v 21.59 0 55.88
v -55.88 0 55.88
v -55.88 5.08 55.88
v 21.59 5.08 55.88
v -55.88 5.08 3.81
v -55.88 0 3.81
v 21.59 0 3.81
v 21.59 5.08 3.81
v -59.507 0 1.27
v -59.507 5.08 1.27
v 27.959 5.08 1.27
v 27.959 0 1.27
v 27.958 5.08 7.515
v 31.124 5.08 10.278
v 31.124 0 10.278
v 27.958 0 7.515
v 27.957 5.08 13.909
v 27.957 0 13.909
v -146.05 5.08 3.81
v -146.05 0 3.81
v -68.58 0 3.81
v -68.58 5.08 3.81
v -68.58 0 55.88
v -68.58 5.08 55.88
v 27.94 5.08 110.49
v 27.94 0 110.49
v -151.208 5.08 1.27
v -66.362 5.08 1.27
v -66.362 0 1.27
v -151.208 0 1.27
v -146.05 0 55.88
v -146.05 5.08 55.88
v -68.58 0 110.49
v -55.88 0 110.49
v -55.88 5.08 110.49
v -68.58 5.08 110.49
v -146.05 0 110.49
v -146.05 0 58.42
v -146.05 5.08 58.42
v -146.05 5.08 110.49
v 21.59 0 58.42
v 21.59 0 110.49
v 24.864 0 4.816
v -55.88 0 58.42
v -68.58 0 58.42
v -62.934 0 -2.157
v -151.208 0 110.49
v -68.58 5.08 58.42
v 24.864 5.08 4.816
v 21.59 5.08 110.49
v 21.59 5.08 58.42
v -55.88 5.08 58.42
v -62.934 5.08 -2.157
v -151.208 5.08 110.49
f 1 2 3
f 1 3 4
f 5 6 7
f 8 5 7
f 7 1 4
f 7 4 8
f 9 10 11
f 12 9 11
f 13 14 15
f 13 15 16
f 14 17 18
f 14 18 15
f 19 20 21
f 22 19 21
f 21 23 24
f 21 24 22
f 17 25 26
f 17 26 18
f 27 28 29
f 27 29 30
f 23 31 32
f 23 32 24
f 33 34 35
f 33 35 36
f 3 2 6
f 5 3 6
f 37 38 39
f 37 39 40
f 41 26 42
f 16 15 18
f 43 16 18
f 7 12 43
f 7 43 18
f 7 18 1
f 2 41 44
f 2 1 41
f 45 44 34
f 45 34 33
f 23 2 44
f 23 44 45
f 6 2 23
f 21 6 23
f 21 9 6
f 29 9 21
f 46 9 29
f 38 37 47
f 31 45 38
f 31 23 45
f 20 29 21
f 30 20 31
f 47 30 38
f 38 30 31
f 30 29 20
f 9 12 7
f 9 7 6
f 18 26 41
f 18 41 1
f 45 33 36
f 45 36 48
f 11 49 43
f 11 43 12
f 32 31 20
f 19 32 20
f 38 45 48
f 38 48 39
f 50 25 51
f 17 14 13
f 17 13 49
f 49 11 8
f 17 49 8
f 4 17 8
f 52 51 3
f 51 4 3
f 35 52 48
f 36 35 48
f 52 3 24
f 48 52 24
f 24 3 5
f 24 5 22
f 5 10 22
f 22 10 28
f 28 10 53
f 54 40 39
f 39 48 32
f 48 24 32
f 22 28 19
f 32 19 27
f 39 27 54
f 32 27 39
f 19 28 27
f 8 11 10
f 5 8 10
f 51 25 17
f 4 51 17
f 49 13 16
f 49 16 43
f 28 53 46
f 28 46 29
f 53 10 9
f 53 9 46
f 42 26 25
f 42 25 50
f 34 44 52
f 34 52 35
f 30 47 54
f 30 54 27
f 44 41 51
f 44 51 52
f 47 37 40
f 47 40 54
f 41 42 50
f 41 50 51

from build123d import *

# Parameters (mm, degrees)
SKETCH1_W           = 77.47
SKETCH1_H           = 52.07
BOSS_EXTRUDE4_DEPTH = 5.08
CUT_EXTRUDE9_DEPTH  = 5.08
CUT_EXTRUDE10_DEPTH = 5.08


with BuildPart() as part:
    # Sketch1 → Boss-Extrude4 (new body)
    with BuildSketch(Plane(origin=(0, 0, 0), x_dir=(1, 0, 0), z_dir=(0, 1, 0))):
        Polygon((-151.207591036, -110.49), (-146.05, -110.49), (-146.05, -58.42), (-68.58, -58.42), (-68.58, -110.49), (-55.88, -110.49), (-55.88, -58.42), (21.59, -58.42), (21.59, -110.49), (34.29, -110.49), (34.29, -58.42), (111.76, -58.42), (111.76, -110.49), (151.052408964, -110.49), (151.052408964, 110.49), (-151.207591036, 110.49), align=None)
        with Locations((-107.315, -29.845)):
            Rectangle(SKETCH1_W, SKETCH1_H, mode=Mode.SUBTRACT)
        with Locations((-17.145, -29.845)):
            Rectangle(SKETCH1_W, SKETCH1_H, mode=Mode.SUBTRACT)
        with Locations((73.025, -29.845)):
            Rectangle(SKETCH1_W, SKETCH1_H, mode=Mode.SUBTRACT)
        with Locations((-107.315, 24.765)):
            Rectangle(SKETCH1_W, SKETCH1_H, mode=Mode.SUBTRACT)
        with Locations((-17.145, 24.765)):
            Rectangle(SKETCH1_W, SKETCH1_H, mode=Mode.SUBTRACT)
        with Locations((-107.315, 79.375)):
            Rectangle(SKETCH1_W, SKETCH1_H, mode=Mode.SUBTRACT)
        with Locations((-17.145, 79.375)):
            Rectangle(SKETCH1_W, SKETCH1_H, mode=Mode.SUBTRACT)
        with Locations((73.025, 24.765)):
            Rectangle(SKETCH1_W, SKETCH1_H, mode=Mode.SUBTRACT)
        with Locations((73.025, 79.375)):
            Rectangle(SKETCH1_W, SKETCH1_H, mode=Mode.SUBTRACT)
    extrude(amount=BOSS_EXTRUDE4_DEPTH)

    # Sketch8 → Cut-Extrude9 (cut)
    # profile 1 of 7: a face of its own
    with BuildSketch(Plane(origin=(0, 5.08, 0), x_dir=(1, 0, 0), z_dir=(0, 1, 0))):
        Polygon((118.11, 79.293589744), (111.76, 76.362820513), (111.76, 76.982301683), (113.79525641, 77.921063702), (113.79525641, 80.799679487), (111.76, 81.765154247), (111.76, 82.387179487), (118.11, 79.375), align=None)
        Polygon((116.872309696, 79.340655048), (114.446538462, 80.49057492), (114.446538462, 78.221264022), align=None, mode=Mode.SUBTRACT)
    # profile 2 of 7: a face of its own
    with BuildSketch(Plane(origin=(0, 5.08, 0), x_dir=(1, 0, 0), z_dir=(0, 1, 0))):
        with BuildLine():
            Line((118.11, 26.474615385), (118.11, 25.235653045))
            add(Edge.make_bspline(
                [(118.11, 25.235653045), (118.109681139, 25.175004234), (118.109063106, 25.057451746), (118.099477996, 24.886510758), (118.086408481, 24.726402202), (118.065671027, 24.577079644), (118.040648803, 24.438612083), (118.010346937, 24.310582227), (117.974012938, 24.193397201), (117.916234684, 24.053492664), (117.830376936, 23.893979465), (117.703506539, 23.721262382), (117.548326213, 23.573571833), (117.37327911, 23.4462338), (117.180718496, 23.344994626), (116.975233967, 23.271753187), (116.75947595, 23.225383899), (116.611351899, 23.220615168), (116.536492388, 23.218205128)],
                knots=[0, 0, 0, 0, 1.001505555, 1.941167018, 2.826882275, 3.653841531, 4.429895133, 5.150066043, 5.825578002, 6.45369114, 7.647487171, 8.808567382, 9.977351308, 11.170798116, 12.373658725, 13.556498008, 14.765093433, 16, 16, 16, 16], degree=3))
            add(Edge.make_bspline(
                [(116.536492388, 23.218205128), (116.466353726, 23.220150205), (116.328524642, 23.223972465), (116.12725909, 23.261767034), (115.934882118, 23.318037757), (115.753765338, 23.399726219), (115.586236491, 23.504802861), (115.433291194, 23.631250472), (115.29863595, 23.781802882), (115.223670167, 23.894781468), (115.185590946, 23.952169471)],
                knots=[0, 0, 0, 0, 1.044266239, 2.052081639, 3.041743201, 4.026043445, 5.00270663, 5.980942822, 6.97441044, 8, 8, 8, 8], degree=3))
            add(Edge.make_bspline(
                [(115.185590946, 23.952169471), (115.157917248, 23.880020614), (115.10497061, 23.741981978), (115.010852235, 23.551885993), (114.90963819, 23.387448746), (114.798522364, 23.248489243), (114.677253559, 23.131437365), (114.548260115, 23.026322349), (114.405191505, 22.938259533), (114.252121508, 22.862606152), (114.090124446, 22.803067733), (113.919941192, 22.760940396), (113.743474705, 22.735055197), (113.623194862, 22.731525492), (113.562473958, 22.72974359)],
                knots=[0, 0, 0, 0, 1.272302504, 2.434229863, 3.488457646, 4.447234501, 5.35599188, 6.26022912, 7.18267843, 8.11661068, 9.06895546, 10.019249207, 11.000057067, 12, 12, 12, 12], degree=3))
            add(Edge.make_bspline(
                [(113.562473958, 22.72974359), (113.500485842, 22.731516424), (113.378522486, 22.735004524), (113.199347436, 22.7607231), (113.028142769, 22.804311677), (112.863691196, 22.864204763), (112.70692357, 22.942816916), (112.555876508, 23.036423505), (112.414573802, 23.150354586), (112.279655118, 23.277346904), (112.158418428, 23.421179366), (112.05048411, 23.576340817), (111.961311987, 23.745062992), (111.887341532, 23.924729456), (111.830014808, 24.116534097), (111.790215937, 24.31976575), (111.763336967, 24.53446858), (111.761131196, 24.681807332), (111.76, 24.757367788)],
                knots=[0, 0, 0, 0, 0.978404568, 1.925038397, 2.85041836, 3.763147166, 4.682162379, 5.614488577, 6.562659439, 7.54271123, 8.535210642, 9.526693784, 10.520907202, 11.541451354, 12.589717429, 13.675358278, 14.807842563, 16, 16, 16, 16], degree=3))
            Line((111.76, 24.757367788), (111.76, 26.474615385))
            Line((111.76, 26.474615385), (118.11, 26.474615385))
        make_face()
        with BuildLine():
            Line((117.458717949, 25.90474359), (115.423461538, 25.90474359))
            Line((115.423461538, 25.90474359), (115.423461538, 25.521860978))
            add(Edge.make_bspline(
                [(115.423461538, 25.521860978), (115.424181075, 25.465891945), (115.425571367, 25.357748368), (115.429679415, 25.200723225), (115.440678409, 25.055331233), (115.452311659, 24.921071395), (115.470224485, 24.798843581), (115.49214475, 24.688238604), (115.515124768, 24.588262886), (115.554315522, 24.473021329), (115.611648095, 24.342338932), (115.702715767, 24.203911992), (115.808237502, 24.079896012), (115.932241327, 23.976344233), (116.067626032, 23.890895914), (116.214403686, 23.833871415), (116.366844139, 23.793424687), (116.471770578, 23.789877771), (116.525044071, 23.788076923)],
                knots=[0, 0, 0, 0, 1.156481963, 2.23455883, 3.244418989, 4.168404366, 5.01828131, 5.794834307, 6.498111525, 7.13526334, 8.307595709, 9.435046769, 10.546766856, 11.659452936, 12.760769924, 13.837671619, 14.902137667, 16, 16, 16, 16], degree=3))
            add(Edge.make_bspline(
                [(116.525044071, 23.788076923), (116.56030457, 23.788977603), (116.629471889, 23.790744385), (116.729913527, 23.8068242), (116.82558773, 23.830156168), (116.914294057, 23.866607821), (116.998553798, 23.910685404), (117.074624411, 23.96802234), (117.1466735, 24.032775181), (117.212055599, 24.108821091), (117.270638216, 24.195791849), (117.322185781, 24.294516129), (117.362847974, 24.406172748), (117.399324126, 24.528230019), (117.4246346, 24.66264136), (117.445797527, 24.808093389), (117.456555228, 24.965820019), (117.457980962, 25.074940101), (117.458717949, 25.131346154)],
                knots=[0, 0, 0, 0, 0.911752476, 1.788502045, 2.626783689, 3.45400582, 4.26402138, 5.080402872, 5.911472738, 6.767166405, 7.66795952, 8.620018292, 9.640966946, 10.73819047, 11.913090943, 13.176185384, 14.540321519, 16, 16, 16, 16], degree=3))
            Line((117.458717949, 25.131346154), (117.458717949, 25.90474359))
        make_face(mode=Mode.SUBTRACT)
        with BuildLine():
            Line((114.772179487, 25.90474359), (112.411282051, 25.90474359))
            Line((112.411282051, 25.90474359), (112.411282051, 25.093185096))
            add(Edge.make_bspline(
                [(112.411282051, 25.093185096), (112.411975847, 25.035093328), (112.413313047, 24.923129104), (112.417726104, 24.761477849), (112.427553327, 24.612056238), (112.443574322, 24.47477829), (112.460221531, 24.348435585), (112.483262073, 24.23428334), (112.509456384, 24.132146551), (112.549993321, 24.013731405), (112.612860676, 23.880302727), (112.708268617, 23.736613475), (112.820435778, 23.607586425), (112.95189156, 23.499274679), (113.093745082, 23.409835086), (113.245254404, 23.347105881), (113.401797428, 23.306771901), (113.508807295, 23.302005692), (113.562473958, 23.299615385)],
                knots=[0, 0, 0, 0, 1.159821618, 2.235403267, 3.228114831, 4.14795534, 4.994323282, 5.771256229, 6.471395042, 7.097801288, 8.267864287, 9.404187171, 10.531774336, 11.667624178, 12.792825787, 13.866573821, 14.930062559, 16, 16, 16, 16], degree=3))
            add(Edge.make_bspline(
                [(113.562473958, 23.299615385), (113.596030503, 23.300103956), (113.662602321, 23.301073218), (113.760357737, 23.31624054), (113.855472736, 23.337399943), (113.946509043, 23.368040578), (114.034948011, 23.406675936), (114.119249173, 23.455161844), (114.2014282, 23.511153881), (114.305201688, 23.598743929), (114.42480707, 23.726024945), (114.541892162, 23.906931894), (114.636322991, 24.112618706), (114.676417579, 24.261803289), (114.697129407, 24.338868189)],
                knots=[0, 0, 0, 0, 0.723503378, 1.435336582, 2.130201219, 2.824764462, 3.504949994, 4.209866579, 4.920640069, 5.648298893, 7.13757748, 8.670694625, 10.280166878, 12, 12, 12, 12], degree=3))
            add(Edge.make_bspline(
                [(114.697129407, 24.338868189), (114.703398338, 24.369763806), (114.716990673, 24.436751875), (114.731329404, 24.545986183), (114.744191712, 24.671110852), (114.753456167, 24.811591078), (114.763401398, 24.967985569), (114.767131466, 25.140244081), (114.771684212, 25.328488394), (114.772010172, 25.459103286), (114.772179487, 25.526949119)],
                knots=[0, 0, 0, 0, 0.634452549, 1.375623993, 2.216454381, 3.166361212, 4.209414599, 5.370755378, 6.634280627, 8, 8, 8, 8], degree=3))
            Line((114.772179487, 25.526949119), (114.772179487, 25.90474359))
        make_face(mode=Mode.SUBTRACT)
    # profile 3 of 7: a face of its own
    with BuildSketch(Plane(origin=(0, 5.08, 0), x_dir=(1, 0, 0), z_dir=(0, 1, 0))):
        with BuildLine():
            Line((116.944815705, -32.938589744), (116.563205128, -32.439951923))
            add(Edge.make_bspline(
                [(116.563205128, -32.439951923), (116.605597673, -32.40438124), (116.689811221, -32.333719444), (116.808065537, -32.220037748), (116.918855368, -32.10156191), (117.022708493, -31.978337218), (117.115993196, -31.848145673), (117.203570769, -31.714141081), (117.282070808, -31.574081771), (117.377253654, -31.380403623), (117.476578821, -31.127042527), (117.559860398, -30.808100462), (117.612875959, -30.475158898), (117.618617886, -30.248014681), (117.621538462, -30.132479968)],
                knots=[0, 0, 0, 0, 0.757959112, 1.505699292, 2.245454638, 2.979532153, 3.711538275, 4.438200793, 5.171680507, 5.909471876, 7.393775596, 8.890124382, 10.418191784, 12, 12, 12, 12], degree=3))
            add(Edge.make_bspline(
                [(117.621538462, -30.132479968), (117.620802251, -30.068829613), (117.619336663, -29.942119638), (117.600137483, -29.754060275), (117.572842033, -29.56915638), (117.533326202, -29.388095544), (117.481880175, -29.211237272), (117.421547717, -29.037234935), (117.346470096, -28.868137816), (117.263556886, -28.701910874), (117.169880198, -28.542661658), (117.067735433, -28.391952614), (116.958125128, -28.250472259), (116.84133222, -28.117828549), (116.715905207, -27.995476207), (116.58331959, -27.881454356), (116.441979536, -27.777817938), (116.294535759, -27.682020268), (116.140771545, -27.596777475), (115.9816542, -27.523166197), (115.817792087, -27.46007521), (115.648849522, -27.409690045), (115.475491338, -27.369948117), (115.297349628, -27.342492588), (115.114770175, -27.323466123), (114.991019157, -27.322014016), (114.928639824, -27.321282051)],
                knots=[0, 0, 0, 0, 1.055000685, 2.100209969, 3.131349012, 4.153242145, 5.170189196, 6.184191144, 7.204341339, 8.235672124, 9.263040994, 10.265373269, 11.252624173, 12.22887325, 13.193405896, 14.155809299, 15.126090485, 16.097288279, 17.069732292, 18.038585918, 19.002221264, 19.978698174, 20.959418239, 21.948869816, 22.966084182, 24, 24, 24, 24], degree=3))
            add(Edge.make_bspline(
                [(114.928639824, -27.321282051), (114.834784429, -27.323571352), (114.650511811, -27.328066089), (114.380599417, -27.368068066), (114.122026195, -27.428855875), (113.876408481, -27.519961279), (113.640717603, -27.632300128), (113.418941397, -27.774250951), (113.207728487, -27.938655241), (113.012070568, -28.12783883), (112.833338524, -28.335403668), (112.675948183, -28.55810345), (112.544748325, -28.795383515), (112.435571964, -29.044623973), (112.351649044, -29.307742779), (112.29256842, -29.584266778), (112.254029036, -29.873594541), (112.250339344, -30.071296166), (112.248461538, -30.171913061)],
                knots=[0, 0, 0, 0, 1.029171465, 2.020641659, 2.987623507, 3.938342917, 4.889210282, 5.84687017, 6.821220943, 7.821438502, 8.827599549, 9.822697543, 10.807740252, 11.797342354, 12.80366471, 13.83203677, 14.896651826, 16, 16, 16, 16], degree=3))
            add(Edge.make_bspline(
                [(112.248461538, -30.171913061), (112.251525467, -30.282770797), (112.257556013, -30.50096534), (112.308644936, -30.820947331), (112.391481444, -31.127263648), (112.507410532, -31.41993077), (112.658114697, -31.698123628), (112.840809417, -31.962277569), (113.057232535, -32.212615561), (113.222483354, -32.363149173), (113.306794872, -32.439951923)],
                knots=[0, 0, 0, 0, 1.028121516, 2.023589091, 2.998037872, 3.967518031, 4.937445131, 5.927275754, 6.942489185, 8, 8, 8, 8], degree=3))
            Line((113.306794872, -32.439951923), (112.929000401, -32.938589744))
            add(Edge.make_bspline(
                [(112.929000401, -32.938589744), (112.877223407, -32.898461226), (112.773917427, -32.818396404), (112.628282924, -32.688750355), (112.491292127, -32.552178781), (112.36407883, -32.407649584), (112.243987323, -32.256891333), (112.135043577, -32.097248498), (112.033928993, -31.93147842), (111.942568033, -31.758615962), (111.860652906, -31.579228654), (111.791497891, -31.393503181), (111.731069307, -31.20301302), (111.681684053, -31.007662239), (111.643076564, -30.806798224), (111.617282312, -30.601110145), (111.599606535, -30.390163816), (111.597995761, -30.247848605), (111.597179487, -30.175729167)],
                knots=[0, 0, 0, 0, 0.986756325, 1.968786143, 2.935506311, 3.899499537, 4.868307269, 5.8376204, 6.809456583, 7.792545619, 8.781780509, 9.778496008, 10.776623214, 11.79151764, 12.812666265, 13.856269958, 14.913646641, 16, 16, 16, 16], degree=3))
            add(Edge.make_bspline(
                [(111.597179487, -30.175729167), (111.597654817, -30.107432799), (111.598594721, -29.97238519), (111.613820511, -29.772997455), (111.634593605, -29.578887787), (111.665872129, -29.390610966), (111.702782574, -29.207139554), (111.752260425, -29.030136779), (111.807685342, -28.857860898), (111.872827246, -28.691004051), (111.946335178, -28.52942431), (112.029414149, -28.373642823), (112.121365532, -28.223731239), (112.220162479, -28.07821569), (112.328978441, -27.939245788), (112.446302192, -27.805617249), (112.571738298, -27.676580756), (112.662189246, -27.596747314), (112.707666266, -27.556608574)],
                knots=[0, 0, 0, 0, 1.114604814, 2.203992996, 3.262667896, 4.300477797, 5.318619304, 6.316056647, 7.298880507, 8.271930387, 9.238335007, 10.195173496, 11.151986948, 12.108099108, 13.064862484, 14.031167946, 15.010108607, 16, 16, 16, 16], degree=3))
            add(Edge.make_bspline(
                [(112.707666266, -27.556608574), (112.786662423, -27.492318192), (112.943701026, -27.364513598), (113.198219878, -27.200999858), (113.463955057, -27.061032151), (113.742302642, -26.947864409), (114.032638045, -26.859394879), (114.335107621, -26.798106139), (114.649428887, -26.758279657), (114.86321849, -26.753725276), (114.971889022, -26.751410256)],
                knots=[0, 0, 0, 0, 0.994628077, 1.977248131, 2.950237994, 3.925870899, 4.908910175, 5.911660606, 6.938484602, 8, 8, 8, 8], degree=3))
            add(Edge.make_bspline(
                [(114.971889022, -26.751410256), (115.086103424, -26.754244442), (115.310813128, -26.759820525), (115.640671219, -26.806804203), (115.956243845, -26.883302707), (116.258745252, -26.988641657), (116.546444643, -27.127611896), (116.820557094, -27.295846609), (117.080858784, -27.494989044), (117.324021732, -27.72253816), (117.546337205, -27.97213776), (117.741930009, -28.239412742), (117.904702809, -28.523860895), (118.040767384, -28.82234304), (118.145350881, -29.137095699), (118.218563099, -29.467446937), (118.264132722, -29.812776116), (118.269893457, -30.048383659), (118.272820513, -30.168096955)],
                knots=[0, 0, 0, 0, 1.032901378, 2.032168977, 3.007206631, 3.966850309, 4.924221947, 5.891988639, 6.871730993, 7.884084801, 8.900290346, 9.89161143, 10.874607481, 11.860025555, 12.854717796, 13.869097222, 14.917278314, 16, 16, 16, 16], degree=3))
            add(Edge.make_bspline(
                [(118.272820513, -30.168096955), (118.27194643, -30.24105764), (118.270216271, -30.385475968), (118.253322795, -30.599110851), (118.225211517, -30.807112405), (118.186697164, -31.009983654), (118.139491479, -31.208460249), (118.077695589, -31.40050597), (118.005935411, -31.587166578), (117.925394904, -31.768581871), (117.833318651, -31.942778105), (117.733314188, -32.109723579), (117.623073079, -32.267404402), (117.506239897, -32.418786561), (117.378444314, -32.560461963), (117.243848093, -32.696476823), (117.098457292, -32.822132675), (116.996123317, -32.89969966), (116.944815705, -32.938589744)],
                knots=[0, 0, 0, 0, 1.096705196, 2.170817488, 3.219277236, 4.250701065, 5.274195539, 6.284202015, 7.28098643, 8.279664616, 9.266225751, 10.241373748, 11.203306326, 12.157093976, 13.114198862, 14.069774147, 15.032234603, 16, 16, 16, 16], degree=3))
        make_face()
    # profile 4 of 7: a face of its own
    with BuildSketch(Plane(origin=(0, 5.08, 0), x_dir=(1, 0, 0), z_dir=(0, 1, 0))):
        with BuildLine():
            Line((111.76, -82.012692308), (118.11, -82.012692308))
            Line((118.11, -82.012692308), (118.11, -83.294903846))
            add(Edge.make_bspline(
                [(118.11, -83.294903846), (118.10919924, -83.406426385), (118.107652175, -83.62188735), (118.097786915, -83.933238257), (118.080511466, -84.220906485), (118.054862343, -84.484728674), (118.024076207, -84.725128674), (117.984923928, -84.941721457), (117.938878197, -85.134858028), (117.899605318, -85.253638066), (117.881033654, -85.309807692)],
                knots=[0, 0, 0, 0, 1.314317071, 2.539253741, 3.67075822, 4.709970291, 5.662644612, 6.526156501, 7.303037452, 8, 8, 8, 8], degree=3))
            add(Edge.make_bspline(
                [(117.881033654, -85.309807692), (117.853037914, -85.383276673), (117.797681284, -85.528548601), (117.693258165, -85.735390771), (117.574941266, -85.930107124), (117.44258475, -86.11375686), (117.2924032, -86.282089414), (117.130916153, -86.441891296), (116.951524797, -86.585988874), (116.760320009, -86.720164865), (116.555362101, -86.837571052), (116.340810785, -86.941109671), (116.117067511, -87.029513574), (115.882503759, -87.098492965), (115.639371325, -87.15548169), (115.385829701, -87.193719768), (115.123356971, -87.219119775), (114.945238152, -87.221659883), (114.854861779, -87.222948718)],
                knots=[0, 0, 0, 0, 0.98467389, 1.947018643, 2.898343565, 3.837828625, 4.779009928, 5.722093987, 6.681368302, 7.658573986, 8.646467994, 9.637429229, 10.641859304, 11.657149908, 12.698561448, 13.768651538, 14.867827761, 16, 16, 16, 16], degree=3))
            add(Edge.make_bspline(
                [(114.854861779, -87.222948718), (114.776373797, -87.221806822), (114.621705032, -87.219556598), (114.39375275, -87.199375846), (114.172580583, -87.169987158), (113.959159893, -87.124695693), (113.752052982, -87.069043404), (113.552243376, -87.000351318), (113.359584615, -86.918944546), (113.175646042, -86.82449634), (113.000731948, -86.721221421), (112.837852299, -86.607986514), (112.683909336, -86.491289421), (112.545846691, -86.362132049), (112.415768103, -86.229414775), (112.300701958, -86.08609986), (112.195636064, -85.936856417), (112.101337325, -85.778809783), (112.019522725, -85.608171823), (111.94943361, -85.422613554), (111.891722261, -85.221141181), (111.843495333, -85.004063511), (111.805260876, -84.770955192), (111.779629867, -84.521602395), (111.762298604, -84.256383924), (111.760781079, -84.074267288), (111.76, -83.980530849)],
                knots=[0, 0, 0, 0, 1.105818345, 2.179130549, 3.222742436, 4.24813173, 5.251184997, 6.243232575, 7.223185975, 8.195898781, 9.155064964, 10.083206407, 10.990357329, 11.874224667, 12.744762365, 13.607037788, 14.46074101, 15.315384698, 16.197310979, 17.123950979, 18.107232398, 19.148086642, 20.256146639, 21.433991621, 22.679261309, 24, 24, 24, 24], degree=3))
            Line((111.76, -83.980530849), (111.76, -82.012692308))
        make_face()
        with BuildLine():
            Line((112.411282051, -82.582564103), (112.411282051, -83.311440304))
            add(Edge.make_bspline(
                [(112.411282051, -83.311440304), (112.411732169, -83.416176063), (112.41259791, -83.617621283), (112.420194693, -83.907286506), (112.432607922, -84.171953411), (112.449979849, -84.411659579), (112.472964337, -84.626269665), (112.498590946, -84.816232183), (112.53051775, -84.980924438), (112.559457347, -85.08058213), (112.572830529, -85.126634615)],
                knots=[0, 0, 0, 0, 1.375205317, 2.645023457, 3.804390687, 4.853969522, 5.800190428, 6.637939096, 7.370582563, 8, 8, 8, 8], degree=3))
            add(Edge.make_bspline(
                [(112.572830529, -85.126634615), (112.593242549, -85.184599298), (112.633579048, -85.299144178), (112.707184232, -85.464010709), (112.794265109, -85.61784952), (112.891632722, -85.763227177), (113.000795015, -85.899202305), (113.122082386, -86.02517169), (113.254153497, -86.142030641), (113.397503093, -86.248500834), (113.551204387, -86.34363756), (113.713300631, -86.426559757), (113.883400607, -86.496918019), (114.062117399, -86.554129451), (114.249282549, -86.598465023), (114.444403664, -86.63000926), (114.647541614, -86.649619319), (114.785702691, -86.651909464), (114.856133814, -86.653076923)],
                knots=[0, 0, 0, 0, 0.998463025, 1.973077781, 2.929496817, 3.867873318, 4.813809365, 5.759268434, 6.706333209, 7.676553387, 8.657505312, 9.640584699, 10.632319813, 11.645628493, 12.686877747, 13.755137172, 14.855624085, 16, 16, 16, 16], degree=3))
            add(Edge.make_bspline(
                [(114.856133814, -86.653076923), (114.930398398, -86.652144681), (115.07629183, -86.650313282), (115.290366967, -86.627332533), (115.49623045, -86.593678155), (115.694030492, -86.545268959), (115.88350975, -86.482728451), (116.065738702, -86.407893664), (116.238372234, -86.317032486), (116.402872487, -86.214168026), (116.556748208, -86.098683831), (116.698196661, -85.971092184), (116.827481331, -85.832738462), (116.94480806, -85.684260293), (117.048090353, -85.523581703), (117.139968669, -85.353421689), (117.218033951, -85.17138332), (117.259539698, -85.044720759), (117.280633013, -84.980350561)],
                knots=[0, 0, 0, 0, 1.122272916, 2.204715076, 3.251197285, 4.274229216, 5.279697671, 6.265416158, 7.248880903, 8.225321784, 9.195852973, 10.153576302, 11.101466393, 12.055578741, 13.010401466, 13.985536859, 14.976245305, 16, 16, 16, 16], degree=3))
            add(Edge.make_bspline(
                [(117.280633013, -84.980350561), (117.295358532, -84.927099195), (117.326669026, -84.813872182), (117.36082363, -84.629106297), (117.390948936, -84.421161669), (117.416454236, -84.189115068), (117.434755519, -83.933231006), (117.448492047, -83.653312687), (117.457756937, -83.349239119), (117.458389591, -83.138450807), (117.458717949, -83.029048478)],
                knots=[0, 0, 0, 0, 0.674548936, 1.434276114, 2.292660221, 3.240891867, 4.284742987, 5.42552168, 6.663806718, 8, 8, 8, 8], degree=3))
            Line((117.458717949, -83.029048478), (117.458717949, -82.582564103))
            Line((117.458717949, -82.582564103), (112.411282051, -82.582564103))
        make_face(mode=Mode.SUBTRACT)
    # profile 5 of 7: a face of its own
    with BuildSketch(Plane(origin=(0, 5.08, 0), x_dir=(1, 0, 0), z_dir=(0, 1, 0))):
        with BuildLine():
            Line((-108.006987179, 107.852307692), (-108.291923077, 107.852307692))
            add(Edge.make_bspline(
                [(-108.291923077, 107.852307692), (-108.284203699, 107.884268588), (-108.269112946, 107.946749526), (-108.23763729, 108.03601897), (-108.203347966, 108.120495307), (-108.162173564, 108.198596746), (-108.117262051, 108.271892893), (-108.065806439, 108.338721313), (-108.010180691, 108.400781646), (-107.948653773, 108.455857226), (-107.884129915, 108.50572988), (-107.815699939, 108.548252254), (-107.7447406, 108.584832021), (-107.670760258, 108.614967517), (-107.593538659, 108.637669242), (-107.513773929, 108.654140059), (-107.43125704, 108.664836284), (-107.375243154, 108.66588019), (-107.346800881, 108.666410256)],
                knots=[0, 0, 0, 0, 1.162005537, 2.271625781, 3.343758855, 4.383309926, 5.390229558, 6.379919256, 7.361854164, 8.333198761, 9.295911338, 10.242430842, 11.177959212, 12.116337295, 13.062827104, 14.020064771, 14.994644689, 16, 16, 16, 16], degree=3))
            add(Edge.make_bspline(
                [(-107.346800881, 108.666410256), (-107.305360108, 108.665159098), (-107.223382505, 108.662684071), (-107.102947456, 108.640083118), (-106.986808841, 108.604318891), (-106.876237881, 108.554903438), (-106.773532588, 108.493954947), (-106.682150476, 108.421415507), (-106.603330184, 108.338684712), (-106.53720457, 108.247305886), (-106.485429392, 108.14964696), (-106.447251039, 108.049135389), (-106.424008514, 107.9460096), (-106.420996295, 107.876379783), (-106.419487179, 107.841495393)],
                knots=[0, 0, 0, 0, 1.083050992, 2.142477498, 3.193116406, 4.255571735, 5.30263384, 6.308962982, 7.297363603, 8.282367274, 9.249857812, 10.179914175, 11.08814088, 12, 12, 12, 12], degree=3))
            add(Edge.make_bspline(
                [(-106.419487179, 107.841495393), (-106.420542723, 107.807924943), (-106.422608257, 107.742232783), (-106.44014669, 107.646328282), (-106.469661729, 107.555939116), (-106.510546442, 107.470684776), (-106.563470562, 107.391105814), (-106.627580795, 107.317023185), (-106.703329638, 107.248108306), (-106.760732674, 107.208629927), (-106.790285457, 107.188305288)],
                knots=[0, 0, 0, 0, 1.024540389, 2.004866551, 2.965041327, 3.920577974, 4.882998113, 5.874504559, 6.905732034, 8, 8, 8, 8], degree=3))
            add(Edge.make_bspline(
                [(-106.790285457, 107.188305288), (-106.756510937, 107.171996519), (-106.689593843, 107.139684128), (-106.598380149, 107.076314977), (-106.515578076, 107.003148148), (-106.469401131, 106.94605017), (-106.44619992, 106.917361779)],
                knots=[0, 0, 0, 0, 1.015518401, 2.012035669, 3.001164323, 4, 4, 4, 4], degree=3))
            add(Edge.make_bspline(
                [(-106.44619992, 106.917361779), (-106.430922416, 106.896445104), (-106.400617589, 106.85495428), (-106.363211069, 106.788246236), (-106.329275659, 106.720798814), (-106.302832245, 106.65080421), (-106.282354523, 106.57907369), (-106.267716837, 106.505484088), (-106.258623509, 106.429975311), (-106.257321258, 106.378891847), (-106.256666667, 106.353214143)],
                knots=[0, 0, 0, 0, 1.025084078, 2.033381695, 3.024893161, 4.013698104, 4.991890475, 5.976764909, 6.982997093, 8, 8, 8, 8], degree=3))
            add(Edge.make_bspline(
                [(-106.256666667, 106.353214143), (-106.258294547, 106.308755324), (-106.261542646, 106.220046911), (-106.290574914, 106.088987699), (-106.335581211, 105.960875994), (-106.399495717, 105.838343818), (-106.477389814, 105.723698758), (-106.570061101, 105.621122392), (-106.676456629, 105.532949372), (-106.795116039, 105.459280094), (-106.923673719, 105.400390265), (-107.061174435, 105.359516727), (-107.205636984, 105.332895713), (-107.304703604, 105.330041054), (-107.355069111, 105.328589744)],
                knots=[0, 0, 0, 0, 0.955779014, 1.907060117, 2.875433937, 3.871313158, 4.872415639, 5.851225146, 6.836215519, 7.83643374, 8.849228613, 9.86973379, 10.916971861, 12, 12, 12, 12], degree=3))
            add(Edge.make_bspline(
                [(-107.355069111, 105.328589744), (-107.389013762, 105.329377337), (-107.455805515, 105.330927058), (-107.553997832, 105.341521218), (-107.647725373, 105.36087058), (-107.737114866, 105.386908578), (-107.82224572, 105.419921087), (-107.902858158, 105.46103162), (-107.979448133, 105.509392769), (-108.051292896, 105.565575381), (-108.118383883, 105.628423453), (-108.17893814, 105.699052698), (-108.233965237, 105.776157486), (-108.281991774, 105.860633401), (-108.325205295, 105.951388741), (-108.36074802, 106.049585593), (-108.392031357, 106.154346099), (-108.406576, 106.227350906), (-108.414038462, 106.264807692)],
                knots=[0, 0, 0, 0, 1.048658725, 2.063410685, 3.046034179, 4.001477787, 4.936774919, 5.862367409, 6.792675028, 7.730719943, 8.675894397, 9.627829632, 10.600096036, 11.597688215, 12.626045268, 13.701542398, 14.82072376, 16, 16, 16, 16], degree=3))
            Line((-108.414038462, 106.264807692), (-108.129102564, 106.264807692))
            add(Edge.make_bspline(
                [(-108.129102564, 106.264807692), (-108.12167915, 106.240361087), (-108.107239964, 106.192810317), (-108.082661565, 106.124375183), (-108.054659633, 106.061638949), (-108.024619997, 106.004141403), (-107.993070978, 105.951316295), (-107.957769582, 105.904560456), (-107.921330429, 105.861820237), (-107.89386273, 105.837740482), (-107.880419671, 105.825955529)],
                knots=[0, 0, 0, 0, 1.198163088, 2.33053128, 3.407730985, 4.417276592, 5.372219308, 6.28897303, 7.162600585, 8, 8, 8, 8], degree=3))
            add(Edge.make_bspline(
                [(-107.880419671, 105.825955529), (-107.862642777, 105.812250112), (-107.827143861, 105.784881583), (-107.769296966, 105.749955106), (-107.708459534, 105.71969189), (-107.643313365, 105.696574537), (-107.575264252, 105.677000516), (-107.503212285, 105.664191188), (-107.427793138, 105.655402633), (-107.376296667, 105.654627088), (-107.34998097, 105.654230769)],
                knots=[0, 0, 0, 0, 0.946170439, 1.889420265, 2.845303464, 3.807233317, 4.801018734, 5.828864929, 6.890507805, 8, 8, 8, 8], degree=3))
            add(Edge.make_bspline(
                [(-107.34998097, 105.654230769), (-107.320268864, 105.654789483), (-107.262169405, 105.655882), (-107.177392497, 105.665929249), (-107.096740741, 105.680561838), (-107.021109587, 105.703161472), (-106.949508341, 105.731084102), (-106.882940702, 105.766143727), (-106.820532806, 105.807277867), (-106.763083988, 105.854031247), (-106.711426277, 105.905213603), (-106.665942576, 105.958746889), (-106.627275919, 106.014405392), (-106.596085101, 106.072497116), (-106.571455674, 106.132781502), (-106.55468877, 106.195427726), (-106.54303061, 106.259923103), (-106.542081183, 106.303764382), (-106.541602564, 106.325865385)],
                knots=[0, 0, 0, 0, 1.217147791, 2.380027433, 3.494444702, 4.572153297, 5.609568379, 6.639424714, 7.649109417, 8.668170816, 9.669597737, 10.625200337, 11.543417969, 12.441394052, 13.322311151, 14.205496177, 15.095365482, 16, 16, 16, 16], degree=3))
            add(Edge.make_bspline(
                [(-106.541602564, 106.325865385), (-106.542990766, 106.355448528), (-106.545760263, 106.414467612), (-106.566904474, 106.501297126), (-106.601683301, 106.584956936), (-106.650371936, 106.664019688), (-106.709640776, 106.737294971), (-106.778914656, 106.802674101), (-106.858768834, 106.856621969), (-106.93226543, 106.893895251), (-106.997366679, 106.919328883), (-107.053079206, 106.936269744), (-107.115451268, 106.950614988), (-107.183728599, 106.96396112), (-107.258425659, 106.975319772), (-107.339461128, 106.984791991), (-107.426851426, 106.992371206), (-107.487349841, 106.995755843), (-107.518525641, 106.9975)],
                knots=[0, 0, 0, 0, 1.07054697, 2.135767047, 3.216561865, 4.33974944, 5.486079747, 6.621378074, 7.775625952, 8.963672916, 9.598146892, 10.304877434, 11.070270905, 11.915000392, 12.823868403, 13.805723172, 14.86925407, 16, 16, 16, 16], degree=3))
            Line((-107.518525641, 106.9975), (-107.518525641, 107.323141026))
            add(Edge.make_bspline(
                [(-107.518525641, 107.323141026), (-107.479245298, 107.323807598), (-107.402304755, 107.325113248), (-107.289914921, 107.340904801), (-107.182442702, 107.36274937), (-107.082269872, 107.396209509), (-106.990967111, 107.435071778), (-106.911755757, 107.480294854), (-106.84574556, 107.530563948), (-106.793257302, 107.586654958), (-106.753770073, 107.64681218), (-106.724898621, 107.709510862), (-106.707844039, 107.775300546), (-106.705567413, 107.82019928), (-106.704423077, 107.842767428)],
                knots=[0, 0, 0, 0, 1.321986639, 2.589447074, 3.816329219, 5.01088745, 6.139805852, 7.153945165, 8.075214402, 8.924034688, 9.728124013, 10.488707548, 11.240355623, 12, 12, 12, 12], degree=3))
            add(Edge.make_bspline(
                [(-106.704423077, 107.842767428), (-106.704799007, 107.859347954), (-106.705546902, 107.892334124), (-106.714978718, 107.94052615), (-106.729151955, 107.987244866), (-106.748637138, 108.032291594), (-106.774717676, 108.075353913), (-106.80592882, 108.116798956), (-106.84309274, 108.156390099), (-106.885678967, 108.19329296), (-106.931409676, 108.228462197), (-106.981529114, 108.258319567), (-107.034526101, 108.283851159), (-107.090459309, 108.304905493), (-107.149510255, 108.320743562), (-107.211401489, 108.332115361), (-107.27625103, 108.339225234), (-107.320493959, 108.340248868), (-107.342984776, 108.340769231)],
                knots=[0, 0, 0, 0, 0.884392785, 1.759457502, 2.611959086, 3.489218968, 4.37281399, 5.2945488, 6.255912374, 7.266815255, 8.301784654, 9.332968512, 10.37626691, 11.440494194, 12.520033166, 13.637162961, 14.798855837, 16, 16, 16, 16], degree=3))
            add(Edge.make_bspline(
                [(-107.342984776, 108.340769231), (-107.379135932, 108.339507067), (-107.449747547, 108.337041767), (-107.551542508, 108.315449033), (-107.646175046, 108.280997486), (-107.718509408, 108.239873961), (-107.771924315, 108.199278925), (-107.810094109, 108.163825617), (-107.847577715, 108.124425841), (-107.88190915, 108.078652887), (-107.916629115, 108.029606584), (-107.94823811, 107.974793673), (-107.978953688, 107.915643972), (-107.997461715, 107.873828647), (-108.006987179, 107.852307692)],
                knots=[0, 0, 0, 0, 1.472543308, 2.876219568, 4.221790263, 5.565193594, 6.249813518, 6.953379497, 7.687249741, 8.463570142, 9.283606569, 10.136032583, 11.040678096, 12, 12, 12, 12], degree=3))
        make_face()
    # profile 6 of 7: a face of its own
    with BuildSketch(Plane(origin=(0, 5.08, 0), x_dir=(1, 0, 0), z_dir=(0, 1, 0))):
        with BuildLine():
            Line((-17.836987179, 107.608076923), (-18.121923077, 107.608076923))
            add(Edge.make_bspline(
                [(-18.121923077, 107.608076923), (-18.120066017, 107.645878371), (-18.1164188, 107.720119409), (-18.099338852, 107.828363239), (-18.074899627, 107.931827235), (-18.040345237, 108.029680657), (-17.997431685, 108.122788718), (-17.945969446, 108.210781589), (-17.885015024, 108.293323596), (-17.81588463, 108.369649547), (-17.74080165, 108.4396697), (-17.659788405, 108.500135528), (-17.574657559, 108.551223701), (-17.48566739, 108.593933113), (-17.391813879, 108.625991402), (-17.293948715, 108.649778175), (-17.191641927, 108.664089574), (-17.12193705, 108.665627894), (-17.086486378, 108.666410256)],
                knots=[0, 0, 0, 0, 1.10065271, 2.161652631, 3.183658789, 4.190468796, 5.17591951, 6.163126047, 7.15150782, 8.156236427, 9.156009102, 10.134482811, 11.092018607, 12.041330605, 13.001268258, 13.972401359, 14.968799086, 16, 16, 16, 16], degree=3))
            add(Edge.make_bspline(
                [(-17.086486378, 108.666410256), (-17.051671982, 108.665595228), (-16.983262938, 108.663993726), (-16.883420968, 108.650240507), (-16.788372994, 108.628699863), (-16.698304806, 108.598478021), (-16.613935018, 108.557852148), (-16.534629828, 108.509050095), (-16.459445093, 108.452607819), (-16.391766082, 108.386156146), (-16.329619467, 108.315215411), (-16.276005278, 108.239479956), (-16.230091909, 108.161257675), (-16.191821656, 108.079952092), (-16.163649302, 107.994797659), (-16.142260499, 107.907034125), (-16.13017063, 107.815753047), (-16.128315139, 107.753970671), (-16.127371795, 107.722560096)],
                knots=[0, 0, 0, 0, 1.111607364, 2.184268762, 3.212621178, 4.221274766, 5.211760367, 6.196651075, 7.1921475, 8.207485113, 9.220403448, 10.201281604, 11.166441695, 12.114753415, 13.065576456, 14.026450734, 14.996634279, 16, 16, 16, 16], degree=3))
            add(Edge.make_bspline(
                [(-16.127371795, 107.722560096), (-16.128907826, 107.678338846), (-16.131952934, 107.590672367), (-16.158000975, 107.461844598), (-16.198683167, 107.337027711), (-16.247666484, 107.236573158), (-16.297080773, 107.155625632), (-16.341610154, 107.088979021), (-16.393738947, 107.01721906), (-16.45422587, 106.940586047), (-16.52181969, 106.858479726), (-16.597132653, 106.770949697), (-16.680701811, 106.678900306), (-16.739356308, 106.616030225), (-16.769749599, 106.583452524)],
                knots=[0, 0, 0, 0, 1.184426356, 2.348067706, 3.509069118, 4.696110526, 5.333549288, 6.050745305, 6.844228056, 7.710549037, 8.667450064, 9.695053472, 10.805634456, 12, 12, 12, 12], degree=3))
            Line((-16.769749599, 106.583452524), (-17.564135617, 105.735641026))
            Line((-17.564135617, 105.735641026), (-16.086666667, 105.735641026))
            Line((-16.086666667, 105.735641026), (-16.086666667, 105.41))
            Line((-16.086666667, 105.41), (-18.244038462, 105.41))
            Line((-18.244038462, 105.41), (-17.012708333, 106.72401242))
            add(Edge.make_bspline(
                [(-17.012708333, 106.72401242), (-16.982729179, 106.755307312), (-16.925145359, 106.815418396), (-16.843699735, 106.903178081), (-16.770548653, 106.984593736), (-16.70521859, 107.059511533), (-16.649126767, 107.129027313), (-16.599349814, 107.190889651), (-16.559466742, 107.247816902), (-16.516182061, 107.313803031), (-16.474259378, 107.39436849), (-16.438234598, 107.492824051), (-16.416268271, 107.59417663), (-16.413633171, 107.662667764), (-16.412307692, 107.697119391)],
                knots=[0, 0, 0, 0, 1.329631726, 2.553950428, 3.673215718, 4.687767853, 5.603093632, 6.413772471, 7.123043292, 7.734684054, 8.834405432, 9.900288307, 10.943827018, 12, 12, 12, 12], degree=3))
            add(Edge.make_bspline(
                [(-16.412307692, 107.697119391), (-16.412884401, 107.718783231), (-16.414020984, 107.7614785), (-16.424051896, 107.824076581), (-16.439210712, 107.884460376), (-16.460932482, 107.942815624), (-16.48960431, 107.998555608), (-16.524505162, 108.051748179), (-16.564773291, 108.103173169), (-16.611356228, 108.151390804), (-16.662529535, 108.195551612), (-16.716590033, 108.234671318), (-16.773785485, 108.26736394), (-16.833874739, 108.294164112), (-16.896690271, 108.315187494), (-16.962353576, 108.329754919), (-17.030683219, 108.338901173), (-17.077340748, 108.340138671), (-17.101114784, 108.340769231)],
                knots=[0, 0, 0, 0, 0.991446411, 1.95395049, 2.89581595, 3.838931463, 4.798493298, 5.75982156, 6.748411868, 7.785213223, 8.824556874, 9.840280684, 10.836137867, 11.835679398, 12.848801643, 13.863922112, 14.911575587, 16, 16, 16, 16], degree=3))
            add(Edge.make_bspline(
                [(-17.101114784, 108.340769231), (-17.125944039, 108.340120594), (-17.174704597, 108.33884678), (-17.246295434, 108.32993622), (-17.314590389, 108.314563922), (-17.379761259, 108.293539367), (-17.441918311, 108.266816255), (-17.500759266, 108.233531601), (-17.556152029, 108.193813718), (-17.608200733, 108.148782642), (-17.656155914, 108.098647032), (-17.698289865, 108.042757994), (-17.735105364, 107.982135982), (-17.767226597, 107.916944568), (-17.793312116, 107.846592211), (-17.813244903, 107.77132865), (-17.829017256, 107.691480682), (-17.834286414, 107.636339927), (-17.836987179, 107.608076923)],
                knots=[0, 0, 0, 0, 1.031018746, 2.02475058, 2.990194455, 3.934040569, 4.864654155, 5.795059489, 6.735614925, 7.690564532, 8.649604399, 9.611025574, 10.590972636, 11.591080095, 12.624614302, 13.701020113, 14.821632451, 16, 16, 16, 16], degree=3))
        make_face()
    # profile 7 of 7: a face of its own
    with BuildSketch(Plane(origin=(0, 5.08, 0), x_dir=(1, 0, 0), z_dir=(0, 1, 0))):
        Polygon((72.600776242, 108.585), (73.187820513, 108.585), (73.187820513, 105.41), (72.902884615, 105.41), (72.902884615, 108.259358974), (72.414423077, 108.259358974), align=None)
    extrude(amount=-CUT_EXTRUDE9_DEPTH, mode=Mode.SUBTRACT)


with BuildPart() as cut_extrude9_piece_1:
    # of the separate pieces the step leaves, piece 1, a body of its own (cut_extrude9_pieces)
    add(part.part.solids().sort_by_distance((151.052408964, 0, -110.49))[0])


with BuildPart() as cut_extrude9_piece_2:
    # of the separate pieces the step leaves, piece 2, a body of its own (cut_extrude9_pieces)
    add(part.part.solids().sort_by_distance((117.458717949, 0, 82.582564103))[0])


with BuildPart() as cut_extrude9_piece_3:
    # of the separate pieces the step leaves, piece 3, a body of its own (cut_extrude9_pieces)
    add(part.part.solids().sort_by_distance((111.76, 0, -81.765154247))[0])


with BuildPart() as cut_extrude9_piece_4:
    # of the separate pieces the step leaves, piece 4, a body of its own (cut_extrude9_pieces)
    add(part.part.solids().sort_by_distance((114.772179487, 0, -25.526949119))[0])


with BuildPart() as cut_extrude9_piece_5:
    # of the separate pieces the step leaves, piece 5, a body of its own (cut_extrude9_pieces)
    add(part.part.solids().sort_by_distance((117.458717949, 0, -25.131346154))[0])


with BuildPart() as cut_extrude9_piece_6:
    # of the separate pieces the step leaves, piece 6, a body of its own (cut_extrude9_pieces)
    add(part.part.solids().sort_by_distance((114.446538462, 0, -78.221264022))[0])


with BuildPart() as cut_extrude10_tool:
    # Sketch9 → Cut-Extrude10 (new body)
    with BuildSketch(Plane(origin=(0, 5.08, 0), x_dir=(1, 0, 0), z_dir=(0, 1, 0))):
        Polygon((151.052408964, -110.49), (151.052408964, 110.49), (-151.207591036, 110.49), (-151.207591036, -1.27), (-66.361816431, -1.27), (-62.934325445, 2.157490986), (-59.506834459, -1.27), (27.958767714, -1.27), (24.86439919, -4.816499558), (31.124383857, -10.278420307), (27.956595892, -13.909066924), (27.94, -110.49), align=None)
    extrude(amount=-CUT_EXTRUDE10_DEPTH)


with BuildPart() as cut_extrude9_piece_1_1:
    add(cut_extrude9_piece_1.part)

    # Cut-Extrude10: cut by cut_extrude10_tool
    add(cut_extrude10_tool.part, mode=Mode.SUBTRACT)


with BuildPart() as cut_extrude9_piece_2_1:
    add(cut_extrude9_piece_2.part)

    # Cut-Extrude10: cut by cut_extrude10_tool
    add(cut_extrude10_tool.part, mode=Mode.SUBTRACT)


with BuildPart() as cut_extrude9_piece_3_1:
    add(cut_extrude9_piece_3.part)

    # Cut-Extrude10: cut by cut_extrude10_tool
    add(cut_extrude10_tool.part, mode=Mode.SUBTRACT)


with BuildPart() as cut_extrude9_piece_4_1:
    add(cut_extrude9_piece_4.part)

    # Cut-Extrude10: cut by cut_extrude10_tool
    add(cut_extrude10_tool.part, mode=Mode.SUBTRACT)


with BuildPart() as cut_extrude9_piece_5_1:
    add(cut_extrude9_piece_5.part)

    # Cut-Extrude10: cut by cut_extrude10_tool
    add(cut_extrude10_tool.part, mode=Mode.SUBTRACT)


with BuildPart() as cut_extrude9_piece_6_1:
    add(cut_extrude9_piece_6.part)

    # Cut-Extrude10: cut by cut_extrude10_tool
    add(cut_extrude10_tool.part, mode=Mode.SUBTRACT)


solid = cut_extrude9_piece_1_1.part
